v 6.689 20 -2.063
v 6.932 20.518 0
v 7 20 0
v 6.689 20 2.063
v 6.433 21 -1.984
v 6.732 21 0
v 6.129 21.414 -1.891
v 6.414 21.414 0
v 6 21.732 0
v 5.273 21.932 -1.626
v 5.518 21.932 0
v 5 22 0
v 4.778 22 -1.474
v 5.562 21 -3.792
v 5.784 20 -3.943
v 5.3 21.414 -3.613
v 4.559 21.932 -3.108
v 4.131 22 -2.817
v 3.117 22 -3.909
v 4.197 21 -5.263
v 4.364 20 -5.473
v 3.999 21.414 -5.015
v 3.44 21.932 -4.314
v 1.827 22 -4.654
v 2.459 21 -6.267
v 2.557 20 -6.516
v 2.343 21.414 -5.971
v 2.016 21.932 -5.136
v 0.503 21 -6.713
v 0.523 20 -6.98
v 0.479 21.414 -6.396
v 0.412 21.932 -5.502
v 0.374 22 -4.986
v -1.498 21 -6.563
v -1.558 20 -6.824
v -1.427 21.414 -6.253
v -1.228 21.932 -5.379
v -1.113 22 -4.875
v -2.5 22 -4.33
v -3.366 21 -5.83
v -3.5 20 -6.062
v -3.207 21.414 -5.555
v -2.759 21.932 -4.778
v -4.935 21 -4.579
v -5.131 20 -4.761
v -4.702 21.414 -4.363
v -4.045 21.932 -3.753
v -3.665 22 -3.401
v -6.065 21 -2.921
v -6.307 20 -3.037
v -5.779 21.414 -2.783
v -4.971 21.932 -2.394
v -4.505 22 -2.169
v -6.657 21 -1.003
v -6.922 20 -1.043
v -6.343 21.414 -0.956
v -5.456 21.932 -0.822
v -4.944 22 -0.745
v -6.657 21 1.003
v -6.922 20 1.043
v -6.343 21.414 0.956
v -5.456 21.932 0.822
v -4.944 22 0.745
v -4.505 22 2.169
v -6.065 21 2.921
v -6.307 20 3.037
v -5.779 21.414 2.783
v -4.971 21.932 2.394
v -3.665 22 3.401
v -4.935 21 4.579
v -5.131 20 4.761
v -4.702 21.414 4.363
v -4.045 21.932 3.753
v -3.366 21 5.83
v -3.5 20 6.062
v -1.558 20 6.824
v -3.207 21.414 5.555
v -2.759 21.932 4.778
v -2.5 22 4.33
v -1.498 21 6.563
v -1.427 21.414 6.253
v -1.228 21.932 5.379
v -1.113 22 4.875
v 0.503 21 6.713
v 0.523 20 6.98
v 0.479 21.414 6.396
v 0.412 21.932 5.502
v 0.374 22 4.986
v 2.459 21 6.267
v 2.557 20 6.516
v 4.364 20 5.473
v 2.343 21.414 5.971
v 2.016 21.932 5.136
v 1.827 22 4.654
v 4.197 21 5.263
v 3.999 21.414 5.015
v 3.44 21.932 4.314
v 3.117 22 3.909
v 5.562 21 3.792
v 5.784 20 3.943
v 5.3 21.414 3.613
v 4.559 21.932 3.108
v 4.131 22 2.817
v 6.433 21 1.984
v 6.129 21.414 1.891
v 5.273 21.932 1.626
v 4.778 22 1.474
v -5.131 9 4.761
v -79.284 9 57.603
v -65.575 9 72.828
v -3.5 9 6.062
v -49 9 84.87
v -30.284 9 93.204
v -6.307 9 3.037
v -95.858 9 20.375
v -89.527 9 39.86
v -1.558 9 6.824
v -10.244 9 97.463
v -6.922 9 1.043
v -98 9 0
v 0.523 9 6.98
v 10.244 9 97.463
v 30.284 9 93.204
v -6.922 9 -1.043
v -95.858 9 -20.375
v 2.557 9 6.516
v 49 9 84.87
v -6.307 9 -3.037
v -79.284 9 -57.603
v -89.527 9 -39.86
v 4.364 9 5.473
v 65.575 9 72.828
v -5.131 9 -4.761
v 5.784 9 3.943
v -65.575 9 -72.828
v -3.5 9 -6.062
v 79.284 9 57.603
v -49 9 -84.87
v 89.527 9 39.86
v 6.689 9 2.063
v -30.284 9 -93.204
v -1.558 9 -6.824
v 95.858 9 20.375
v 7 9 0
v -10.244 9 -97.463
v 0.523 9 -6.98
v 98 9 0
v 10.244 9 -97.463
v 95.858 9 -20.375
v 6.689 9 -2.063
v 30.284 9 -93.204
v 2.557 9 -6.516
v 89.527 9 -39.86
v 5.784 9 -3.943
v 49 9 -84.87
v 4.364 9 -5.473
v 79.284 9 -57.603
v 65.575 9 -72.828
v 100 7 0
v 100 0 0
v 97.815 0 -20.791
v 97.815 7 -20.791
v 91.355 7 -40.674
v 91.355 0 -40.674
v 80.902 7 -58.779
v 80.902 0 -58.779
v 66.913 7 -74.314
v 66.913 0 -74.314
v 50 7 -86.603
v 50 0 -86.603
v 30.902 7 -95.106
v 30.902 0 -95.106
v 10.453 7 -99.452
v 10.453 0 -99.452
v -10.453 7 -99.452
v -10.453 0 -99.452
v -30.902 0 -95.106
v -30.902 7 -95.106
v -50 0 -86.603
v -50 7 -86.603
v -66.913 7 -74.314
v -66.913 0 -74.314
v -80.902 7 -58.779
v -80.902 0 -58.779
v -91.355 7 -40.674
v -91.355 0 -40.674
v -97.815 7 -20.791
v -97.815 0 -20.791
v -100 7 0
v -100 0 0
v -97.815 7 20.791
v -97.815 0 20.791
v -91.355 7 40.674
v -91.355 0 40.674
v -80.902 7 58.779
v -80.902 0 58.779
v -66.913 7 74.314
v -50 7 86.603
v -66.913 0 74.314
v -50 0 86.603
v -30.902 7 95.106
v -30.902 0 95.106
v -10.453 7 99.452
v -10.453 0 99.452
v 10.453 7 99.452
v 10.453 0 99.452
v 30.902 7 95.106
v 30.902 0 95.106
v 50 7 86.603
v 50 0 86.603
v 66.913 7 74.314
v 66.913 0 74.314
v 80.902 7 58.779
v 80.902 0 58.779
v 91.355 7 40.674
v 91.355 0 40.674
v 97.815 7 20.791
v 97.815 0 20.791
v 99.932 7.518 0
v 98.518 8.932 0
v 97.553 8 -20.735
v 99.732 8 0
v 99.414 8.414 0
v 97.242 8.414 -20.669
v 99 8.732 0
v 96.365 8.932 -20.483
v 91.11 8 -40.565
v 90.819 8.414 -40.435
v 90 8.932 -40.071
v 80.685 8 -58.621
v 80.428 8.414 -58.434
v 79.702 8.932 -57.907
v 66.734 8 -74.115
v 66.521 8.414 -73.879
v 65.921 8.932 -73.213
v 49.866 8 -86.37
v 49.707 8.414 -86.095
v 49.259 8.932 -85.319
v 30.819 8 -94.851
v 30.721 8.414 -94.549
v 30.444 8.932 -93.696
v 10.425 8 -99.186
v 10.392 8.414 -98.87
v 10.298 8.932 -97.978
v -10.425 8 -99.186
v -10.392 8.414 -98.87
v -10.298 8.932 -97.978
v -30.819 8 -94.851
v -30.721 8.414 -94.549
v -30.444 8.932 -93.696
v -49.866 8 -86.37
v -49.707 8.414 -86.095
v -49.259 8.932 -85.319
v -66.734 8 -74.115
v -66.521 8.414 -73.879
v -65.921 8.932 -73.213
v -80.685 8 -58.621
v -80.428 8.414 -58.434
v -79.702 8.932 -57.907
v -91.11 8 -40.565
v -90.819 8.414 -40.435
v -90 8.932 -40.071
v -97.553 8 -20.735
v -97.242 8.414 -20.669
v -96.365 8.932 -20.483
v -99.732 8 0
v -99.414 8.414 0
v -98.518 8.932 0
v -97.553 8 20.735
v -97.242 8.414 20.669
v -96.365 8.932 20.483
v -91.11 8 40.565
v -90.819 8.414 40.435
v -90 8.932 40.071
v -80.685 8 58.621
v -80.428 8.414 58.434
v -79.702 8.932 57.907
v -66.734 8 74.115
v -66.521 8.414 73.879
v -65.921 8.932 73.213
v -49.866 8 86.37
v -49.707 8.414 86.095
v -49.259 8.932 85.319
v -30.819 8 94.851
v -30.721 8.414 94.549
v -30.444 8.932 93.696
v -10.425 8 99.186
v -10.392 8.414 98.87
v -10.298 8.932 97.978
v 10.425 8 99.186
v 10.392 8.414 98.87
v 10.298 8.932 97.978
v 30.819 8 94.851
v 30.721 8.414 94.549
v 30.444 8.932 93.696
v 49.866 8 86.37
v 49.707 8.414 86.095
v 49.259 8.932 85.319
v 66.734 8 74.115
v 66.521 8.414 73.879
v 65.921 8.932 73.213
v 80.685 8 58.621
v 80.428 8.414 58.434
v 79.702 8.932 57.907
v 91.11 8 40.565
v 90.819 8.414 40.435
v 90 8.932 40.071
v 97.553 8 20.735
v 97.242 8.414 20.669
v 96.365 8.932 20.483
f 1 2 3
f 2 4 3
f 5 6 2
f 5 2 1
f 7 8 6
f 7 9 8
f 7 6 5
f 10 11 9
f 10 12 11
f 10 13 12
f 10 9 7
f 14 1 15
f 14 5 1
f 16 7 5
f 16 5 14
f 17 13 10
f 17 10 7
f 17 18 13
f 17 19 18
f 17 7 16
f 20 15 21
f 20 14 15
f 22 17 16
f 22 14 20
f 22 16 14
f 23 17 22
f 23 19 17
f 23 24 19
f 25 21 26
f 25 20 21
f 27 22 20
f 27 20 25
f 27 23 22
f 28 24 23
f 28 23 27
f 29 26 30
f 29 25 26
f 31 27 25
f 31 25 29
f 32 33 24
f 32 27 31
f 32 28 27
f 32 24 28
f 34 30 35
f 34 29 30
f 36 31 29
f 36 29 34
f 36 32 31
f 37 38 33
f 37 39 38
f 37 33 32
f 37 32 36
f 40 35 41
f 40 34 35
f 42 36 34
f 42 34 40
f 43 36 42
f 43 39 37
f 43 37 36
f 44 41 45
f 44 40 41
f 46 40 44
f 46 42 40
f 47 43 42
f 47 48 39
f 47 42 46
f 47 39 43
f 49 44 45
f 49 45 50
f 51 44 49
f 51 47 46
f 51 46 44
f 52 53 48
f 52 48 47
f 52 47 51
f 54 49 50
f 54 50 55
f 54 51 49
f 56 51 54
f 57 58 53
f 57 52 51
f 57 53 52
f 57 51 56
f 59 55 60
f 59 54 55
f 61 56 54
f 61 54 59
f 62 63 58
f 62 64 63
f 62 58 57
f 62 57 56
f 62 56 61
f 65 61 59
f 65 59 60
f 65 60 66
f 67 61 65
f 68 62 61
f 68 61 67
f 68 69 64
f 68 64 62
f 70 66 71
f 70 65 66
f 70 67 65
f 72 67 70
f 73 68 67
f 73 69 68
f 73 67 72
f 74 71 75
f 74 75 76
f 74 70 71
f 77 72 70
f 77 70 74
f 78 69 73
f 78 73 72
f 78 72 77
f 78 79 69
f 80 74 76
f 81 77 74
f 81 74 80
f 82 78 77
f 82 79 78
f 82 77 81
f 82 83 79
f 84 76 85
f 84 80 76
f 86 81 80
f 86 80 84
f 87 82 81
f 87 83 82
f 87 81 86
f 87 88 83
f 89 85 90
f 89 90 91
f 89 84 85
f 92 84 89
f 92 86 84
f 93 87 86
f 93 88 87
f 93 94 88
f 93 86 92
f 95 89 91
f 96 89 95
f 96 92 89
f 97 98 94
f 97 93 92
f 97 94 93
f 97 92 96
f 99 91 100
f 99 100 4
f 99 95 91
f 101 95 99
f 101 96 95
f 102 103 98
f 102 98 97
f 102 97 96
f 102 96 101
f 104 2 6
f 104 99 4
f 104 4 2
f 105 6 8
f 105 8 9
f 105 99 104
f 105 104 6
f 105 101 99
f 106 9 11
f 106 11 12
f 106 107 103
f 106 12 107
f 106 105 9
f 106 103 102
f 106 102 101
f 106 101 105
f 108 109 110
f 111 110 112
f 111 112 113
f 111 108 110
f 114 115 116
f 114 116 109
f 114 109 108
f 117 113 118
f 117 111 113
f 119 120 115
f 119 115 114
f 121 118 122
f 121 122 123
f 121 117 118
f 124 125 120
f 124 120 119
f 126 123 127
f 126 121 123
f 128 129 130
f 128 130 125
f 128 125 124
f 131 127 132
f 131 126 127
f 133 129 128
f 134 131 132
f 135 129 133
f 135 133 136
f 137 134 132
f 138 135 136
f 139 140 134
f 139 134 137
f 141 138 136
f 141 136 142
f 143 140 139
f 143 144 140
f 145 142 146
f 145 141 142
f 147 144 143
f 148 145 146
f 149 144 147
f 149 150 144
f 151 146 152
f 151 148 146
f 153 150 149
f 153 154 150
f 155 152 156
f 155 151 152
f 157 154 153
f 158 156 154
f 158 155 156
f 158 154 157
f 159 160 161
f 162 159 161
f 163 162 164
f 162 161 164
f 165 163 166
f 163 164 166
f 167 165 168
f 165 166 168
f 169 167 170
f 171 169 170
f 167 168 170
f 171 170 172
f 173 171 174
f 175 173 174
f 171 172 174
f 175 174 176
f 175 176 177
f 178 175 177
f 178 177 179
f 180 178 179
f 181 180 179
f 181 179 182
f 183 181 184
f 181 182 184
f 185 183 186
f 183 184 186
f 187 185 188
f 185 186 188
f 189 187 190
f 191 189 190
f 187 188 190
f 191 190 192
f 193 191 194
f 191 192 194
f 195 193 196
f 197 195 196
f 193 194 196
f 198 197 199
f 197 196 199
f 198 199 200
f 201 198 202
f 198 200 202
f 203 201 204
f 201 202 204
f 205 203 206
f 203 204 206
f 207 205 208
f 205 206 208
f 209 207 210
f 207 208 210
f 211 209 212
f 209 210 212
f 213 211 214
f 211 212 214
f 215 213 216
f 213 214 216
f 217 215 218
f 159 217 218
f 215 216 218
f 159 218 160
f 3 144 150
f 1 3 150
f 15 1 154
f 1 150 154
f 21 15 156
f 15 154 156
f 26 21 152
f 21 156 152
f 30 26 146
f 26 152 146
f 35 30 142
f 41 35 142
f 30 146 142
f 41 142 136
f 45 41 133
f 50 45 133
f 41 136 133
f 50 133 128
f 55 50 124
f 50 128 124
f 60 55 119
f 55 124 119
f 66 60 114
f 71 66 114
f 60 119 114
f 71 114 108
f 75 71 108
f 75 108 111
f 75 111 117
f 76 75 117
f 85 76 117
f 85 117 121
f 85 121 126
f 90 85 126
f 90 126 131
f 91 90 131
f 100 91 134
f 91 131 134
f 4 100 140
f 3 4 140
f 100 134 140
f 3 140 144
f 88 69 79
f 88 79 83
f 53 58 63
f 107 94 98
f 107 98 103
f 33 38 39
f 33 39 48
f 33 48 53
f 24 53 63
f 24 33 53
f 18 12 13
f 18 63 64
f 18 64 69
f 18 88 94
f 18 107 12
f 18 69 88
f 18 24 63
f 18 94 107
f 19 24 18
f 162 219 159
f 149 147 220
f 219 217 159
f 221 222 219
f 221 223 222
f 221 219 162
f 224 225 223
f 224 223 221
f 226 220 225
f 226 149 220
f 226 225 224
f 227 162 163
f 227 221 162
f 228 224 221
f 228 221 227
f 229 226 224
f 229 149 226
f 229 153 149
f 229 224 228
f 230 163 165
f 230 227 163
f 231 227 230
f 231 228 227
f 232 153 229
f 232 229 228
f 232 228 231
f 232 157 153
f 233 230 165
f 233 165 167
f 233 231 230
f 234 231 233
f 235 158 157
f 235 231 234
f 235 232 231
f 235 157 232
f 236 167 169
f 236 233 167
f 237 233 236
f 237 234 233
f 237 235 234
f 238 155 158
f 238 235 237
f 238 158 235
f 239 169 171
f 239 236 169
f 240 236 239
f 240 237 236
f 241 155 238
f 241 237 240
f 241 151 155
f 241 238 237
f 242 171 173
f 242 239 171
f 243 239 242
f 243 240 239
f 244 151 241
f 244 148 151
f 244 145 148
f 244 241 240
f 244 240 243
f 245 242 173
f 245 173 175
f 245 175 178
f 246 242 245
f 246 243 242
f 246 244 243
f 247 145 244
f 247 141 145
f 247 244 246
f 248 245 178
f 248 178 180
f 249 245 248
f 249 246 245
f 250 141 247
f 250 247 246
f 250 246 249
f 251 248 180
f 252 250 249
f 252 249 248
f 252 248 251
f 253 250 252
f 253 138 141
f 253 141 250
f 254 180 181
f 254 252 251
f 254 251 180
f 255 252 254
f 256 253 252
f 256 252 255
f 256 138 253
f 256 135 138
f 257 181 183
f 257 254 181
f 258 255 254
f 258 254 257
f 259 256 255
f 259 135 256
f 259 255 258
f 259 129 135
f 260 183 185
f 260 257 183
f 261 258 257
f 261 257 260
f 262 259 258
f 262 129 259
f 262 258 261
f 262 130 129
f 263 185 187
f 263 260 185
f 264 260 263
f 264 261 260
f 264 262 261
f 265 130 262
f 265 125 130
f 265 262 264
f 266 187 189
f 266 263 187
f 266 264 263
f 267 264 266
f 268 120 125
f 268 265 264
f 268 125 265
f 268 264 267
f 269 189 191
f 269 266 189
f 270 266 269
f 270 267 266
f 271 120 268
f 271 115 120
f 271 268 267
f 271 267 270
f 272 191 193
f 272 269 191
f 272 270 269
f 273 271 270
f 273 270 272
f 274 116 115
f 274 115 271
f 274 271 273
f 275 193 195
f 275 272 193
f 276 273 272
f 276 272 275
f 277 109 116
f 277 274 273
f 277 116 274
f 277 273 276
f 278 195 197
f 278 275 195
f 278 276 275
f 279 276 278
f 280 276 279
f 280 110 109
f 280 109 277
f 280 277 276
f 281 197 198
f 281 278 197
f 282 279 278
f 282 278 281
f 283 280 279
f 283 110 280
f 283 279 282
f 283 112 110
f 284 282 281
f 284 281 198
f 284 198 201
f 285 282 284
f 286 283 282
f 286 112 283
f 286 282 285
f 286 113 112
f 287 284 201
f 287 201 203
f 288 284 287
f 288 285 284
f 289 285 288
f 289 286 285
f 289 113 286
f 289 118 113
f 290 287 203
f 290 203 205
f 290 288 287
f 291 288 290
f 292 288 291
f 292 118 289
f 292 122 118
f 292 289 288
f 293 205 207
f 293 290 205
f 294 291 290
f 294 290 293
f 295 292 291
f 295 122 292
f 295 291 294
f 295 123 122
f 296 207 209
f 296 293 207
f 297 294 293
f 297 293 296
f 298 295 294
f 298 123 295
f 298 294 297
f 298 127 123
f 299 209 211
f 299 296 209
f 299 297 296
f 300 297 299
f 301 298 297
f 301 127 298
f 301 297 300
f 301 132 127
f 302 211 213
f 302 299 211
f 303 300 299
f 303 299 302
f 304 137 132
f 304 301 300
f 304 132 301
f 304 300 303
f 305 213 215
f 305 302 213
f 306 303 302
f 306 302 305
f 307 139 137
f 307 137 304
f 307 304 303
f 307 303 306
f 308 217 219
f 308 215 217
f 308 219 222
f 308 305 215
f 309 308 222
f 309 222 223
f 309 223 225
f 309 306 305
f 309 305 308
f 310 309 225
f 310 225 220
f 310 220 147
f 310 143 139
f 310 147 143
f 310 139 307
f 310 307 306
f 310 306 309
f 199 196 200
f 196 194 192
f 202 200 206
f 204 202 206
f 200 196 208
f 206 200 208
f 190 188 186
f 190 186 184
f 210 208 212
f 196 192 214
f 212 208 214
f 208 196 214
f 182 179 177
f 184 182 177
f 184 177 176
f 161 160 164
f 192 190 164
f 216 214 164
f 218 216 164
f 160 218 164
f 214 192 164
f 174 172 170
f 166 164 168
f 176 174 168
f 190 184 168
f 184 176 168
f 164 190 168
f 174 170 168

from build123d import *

# Parameters (mm, degrees)
SKETCH1_R           = 100
BOSS_EXTRUDE1_DEPTH = 9
SKETCH2_R           = 7
BOSS_EXTRUDE2_DEPTH = 13
FILLET1_R           = 2


with BuildPart() as part:
    # Sketch1 → Boss-Extrude1 (new body)
    with BuildSketch(Plane(origin=(0, 0, 0), x_dir=(1, 0, 0), z_dir=(0, 1, 0))):
        Circle(SKETCH1_R)
    extrude(amount=BOSS_EXTRUDE1_DEPTH)

    # Sketch2 → Boss-Extrude2 (add)
    with BuildSketch(Plane(origin=(0, 9, 0), x_dir=(1, 0, 0), z_dir=(0, 1, 0))):
        Circle(SKETCH2_R)
    extrude(amount=BOSS_EXTRUDE2_DEPTH)

    # Fillet1
    fillet1_edges = [part.edges().sort_by_distance(p)[0] for p in [
        (-100, 9, 0),
        (-7, 22, 0),
    ]]
    fillet(fillet1_edges, radius=FILLET1_R)


solid = part.part
